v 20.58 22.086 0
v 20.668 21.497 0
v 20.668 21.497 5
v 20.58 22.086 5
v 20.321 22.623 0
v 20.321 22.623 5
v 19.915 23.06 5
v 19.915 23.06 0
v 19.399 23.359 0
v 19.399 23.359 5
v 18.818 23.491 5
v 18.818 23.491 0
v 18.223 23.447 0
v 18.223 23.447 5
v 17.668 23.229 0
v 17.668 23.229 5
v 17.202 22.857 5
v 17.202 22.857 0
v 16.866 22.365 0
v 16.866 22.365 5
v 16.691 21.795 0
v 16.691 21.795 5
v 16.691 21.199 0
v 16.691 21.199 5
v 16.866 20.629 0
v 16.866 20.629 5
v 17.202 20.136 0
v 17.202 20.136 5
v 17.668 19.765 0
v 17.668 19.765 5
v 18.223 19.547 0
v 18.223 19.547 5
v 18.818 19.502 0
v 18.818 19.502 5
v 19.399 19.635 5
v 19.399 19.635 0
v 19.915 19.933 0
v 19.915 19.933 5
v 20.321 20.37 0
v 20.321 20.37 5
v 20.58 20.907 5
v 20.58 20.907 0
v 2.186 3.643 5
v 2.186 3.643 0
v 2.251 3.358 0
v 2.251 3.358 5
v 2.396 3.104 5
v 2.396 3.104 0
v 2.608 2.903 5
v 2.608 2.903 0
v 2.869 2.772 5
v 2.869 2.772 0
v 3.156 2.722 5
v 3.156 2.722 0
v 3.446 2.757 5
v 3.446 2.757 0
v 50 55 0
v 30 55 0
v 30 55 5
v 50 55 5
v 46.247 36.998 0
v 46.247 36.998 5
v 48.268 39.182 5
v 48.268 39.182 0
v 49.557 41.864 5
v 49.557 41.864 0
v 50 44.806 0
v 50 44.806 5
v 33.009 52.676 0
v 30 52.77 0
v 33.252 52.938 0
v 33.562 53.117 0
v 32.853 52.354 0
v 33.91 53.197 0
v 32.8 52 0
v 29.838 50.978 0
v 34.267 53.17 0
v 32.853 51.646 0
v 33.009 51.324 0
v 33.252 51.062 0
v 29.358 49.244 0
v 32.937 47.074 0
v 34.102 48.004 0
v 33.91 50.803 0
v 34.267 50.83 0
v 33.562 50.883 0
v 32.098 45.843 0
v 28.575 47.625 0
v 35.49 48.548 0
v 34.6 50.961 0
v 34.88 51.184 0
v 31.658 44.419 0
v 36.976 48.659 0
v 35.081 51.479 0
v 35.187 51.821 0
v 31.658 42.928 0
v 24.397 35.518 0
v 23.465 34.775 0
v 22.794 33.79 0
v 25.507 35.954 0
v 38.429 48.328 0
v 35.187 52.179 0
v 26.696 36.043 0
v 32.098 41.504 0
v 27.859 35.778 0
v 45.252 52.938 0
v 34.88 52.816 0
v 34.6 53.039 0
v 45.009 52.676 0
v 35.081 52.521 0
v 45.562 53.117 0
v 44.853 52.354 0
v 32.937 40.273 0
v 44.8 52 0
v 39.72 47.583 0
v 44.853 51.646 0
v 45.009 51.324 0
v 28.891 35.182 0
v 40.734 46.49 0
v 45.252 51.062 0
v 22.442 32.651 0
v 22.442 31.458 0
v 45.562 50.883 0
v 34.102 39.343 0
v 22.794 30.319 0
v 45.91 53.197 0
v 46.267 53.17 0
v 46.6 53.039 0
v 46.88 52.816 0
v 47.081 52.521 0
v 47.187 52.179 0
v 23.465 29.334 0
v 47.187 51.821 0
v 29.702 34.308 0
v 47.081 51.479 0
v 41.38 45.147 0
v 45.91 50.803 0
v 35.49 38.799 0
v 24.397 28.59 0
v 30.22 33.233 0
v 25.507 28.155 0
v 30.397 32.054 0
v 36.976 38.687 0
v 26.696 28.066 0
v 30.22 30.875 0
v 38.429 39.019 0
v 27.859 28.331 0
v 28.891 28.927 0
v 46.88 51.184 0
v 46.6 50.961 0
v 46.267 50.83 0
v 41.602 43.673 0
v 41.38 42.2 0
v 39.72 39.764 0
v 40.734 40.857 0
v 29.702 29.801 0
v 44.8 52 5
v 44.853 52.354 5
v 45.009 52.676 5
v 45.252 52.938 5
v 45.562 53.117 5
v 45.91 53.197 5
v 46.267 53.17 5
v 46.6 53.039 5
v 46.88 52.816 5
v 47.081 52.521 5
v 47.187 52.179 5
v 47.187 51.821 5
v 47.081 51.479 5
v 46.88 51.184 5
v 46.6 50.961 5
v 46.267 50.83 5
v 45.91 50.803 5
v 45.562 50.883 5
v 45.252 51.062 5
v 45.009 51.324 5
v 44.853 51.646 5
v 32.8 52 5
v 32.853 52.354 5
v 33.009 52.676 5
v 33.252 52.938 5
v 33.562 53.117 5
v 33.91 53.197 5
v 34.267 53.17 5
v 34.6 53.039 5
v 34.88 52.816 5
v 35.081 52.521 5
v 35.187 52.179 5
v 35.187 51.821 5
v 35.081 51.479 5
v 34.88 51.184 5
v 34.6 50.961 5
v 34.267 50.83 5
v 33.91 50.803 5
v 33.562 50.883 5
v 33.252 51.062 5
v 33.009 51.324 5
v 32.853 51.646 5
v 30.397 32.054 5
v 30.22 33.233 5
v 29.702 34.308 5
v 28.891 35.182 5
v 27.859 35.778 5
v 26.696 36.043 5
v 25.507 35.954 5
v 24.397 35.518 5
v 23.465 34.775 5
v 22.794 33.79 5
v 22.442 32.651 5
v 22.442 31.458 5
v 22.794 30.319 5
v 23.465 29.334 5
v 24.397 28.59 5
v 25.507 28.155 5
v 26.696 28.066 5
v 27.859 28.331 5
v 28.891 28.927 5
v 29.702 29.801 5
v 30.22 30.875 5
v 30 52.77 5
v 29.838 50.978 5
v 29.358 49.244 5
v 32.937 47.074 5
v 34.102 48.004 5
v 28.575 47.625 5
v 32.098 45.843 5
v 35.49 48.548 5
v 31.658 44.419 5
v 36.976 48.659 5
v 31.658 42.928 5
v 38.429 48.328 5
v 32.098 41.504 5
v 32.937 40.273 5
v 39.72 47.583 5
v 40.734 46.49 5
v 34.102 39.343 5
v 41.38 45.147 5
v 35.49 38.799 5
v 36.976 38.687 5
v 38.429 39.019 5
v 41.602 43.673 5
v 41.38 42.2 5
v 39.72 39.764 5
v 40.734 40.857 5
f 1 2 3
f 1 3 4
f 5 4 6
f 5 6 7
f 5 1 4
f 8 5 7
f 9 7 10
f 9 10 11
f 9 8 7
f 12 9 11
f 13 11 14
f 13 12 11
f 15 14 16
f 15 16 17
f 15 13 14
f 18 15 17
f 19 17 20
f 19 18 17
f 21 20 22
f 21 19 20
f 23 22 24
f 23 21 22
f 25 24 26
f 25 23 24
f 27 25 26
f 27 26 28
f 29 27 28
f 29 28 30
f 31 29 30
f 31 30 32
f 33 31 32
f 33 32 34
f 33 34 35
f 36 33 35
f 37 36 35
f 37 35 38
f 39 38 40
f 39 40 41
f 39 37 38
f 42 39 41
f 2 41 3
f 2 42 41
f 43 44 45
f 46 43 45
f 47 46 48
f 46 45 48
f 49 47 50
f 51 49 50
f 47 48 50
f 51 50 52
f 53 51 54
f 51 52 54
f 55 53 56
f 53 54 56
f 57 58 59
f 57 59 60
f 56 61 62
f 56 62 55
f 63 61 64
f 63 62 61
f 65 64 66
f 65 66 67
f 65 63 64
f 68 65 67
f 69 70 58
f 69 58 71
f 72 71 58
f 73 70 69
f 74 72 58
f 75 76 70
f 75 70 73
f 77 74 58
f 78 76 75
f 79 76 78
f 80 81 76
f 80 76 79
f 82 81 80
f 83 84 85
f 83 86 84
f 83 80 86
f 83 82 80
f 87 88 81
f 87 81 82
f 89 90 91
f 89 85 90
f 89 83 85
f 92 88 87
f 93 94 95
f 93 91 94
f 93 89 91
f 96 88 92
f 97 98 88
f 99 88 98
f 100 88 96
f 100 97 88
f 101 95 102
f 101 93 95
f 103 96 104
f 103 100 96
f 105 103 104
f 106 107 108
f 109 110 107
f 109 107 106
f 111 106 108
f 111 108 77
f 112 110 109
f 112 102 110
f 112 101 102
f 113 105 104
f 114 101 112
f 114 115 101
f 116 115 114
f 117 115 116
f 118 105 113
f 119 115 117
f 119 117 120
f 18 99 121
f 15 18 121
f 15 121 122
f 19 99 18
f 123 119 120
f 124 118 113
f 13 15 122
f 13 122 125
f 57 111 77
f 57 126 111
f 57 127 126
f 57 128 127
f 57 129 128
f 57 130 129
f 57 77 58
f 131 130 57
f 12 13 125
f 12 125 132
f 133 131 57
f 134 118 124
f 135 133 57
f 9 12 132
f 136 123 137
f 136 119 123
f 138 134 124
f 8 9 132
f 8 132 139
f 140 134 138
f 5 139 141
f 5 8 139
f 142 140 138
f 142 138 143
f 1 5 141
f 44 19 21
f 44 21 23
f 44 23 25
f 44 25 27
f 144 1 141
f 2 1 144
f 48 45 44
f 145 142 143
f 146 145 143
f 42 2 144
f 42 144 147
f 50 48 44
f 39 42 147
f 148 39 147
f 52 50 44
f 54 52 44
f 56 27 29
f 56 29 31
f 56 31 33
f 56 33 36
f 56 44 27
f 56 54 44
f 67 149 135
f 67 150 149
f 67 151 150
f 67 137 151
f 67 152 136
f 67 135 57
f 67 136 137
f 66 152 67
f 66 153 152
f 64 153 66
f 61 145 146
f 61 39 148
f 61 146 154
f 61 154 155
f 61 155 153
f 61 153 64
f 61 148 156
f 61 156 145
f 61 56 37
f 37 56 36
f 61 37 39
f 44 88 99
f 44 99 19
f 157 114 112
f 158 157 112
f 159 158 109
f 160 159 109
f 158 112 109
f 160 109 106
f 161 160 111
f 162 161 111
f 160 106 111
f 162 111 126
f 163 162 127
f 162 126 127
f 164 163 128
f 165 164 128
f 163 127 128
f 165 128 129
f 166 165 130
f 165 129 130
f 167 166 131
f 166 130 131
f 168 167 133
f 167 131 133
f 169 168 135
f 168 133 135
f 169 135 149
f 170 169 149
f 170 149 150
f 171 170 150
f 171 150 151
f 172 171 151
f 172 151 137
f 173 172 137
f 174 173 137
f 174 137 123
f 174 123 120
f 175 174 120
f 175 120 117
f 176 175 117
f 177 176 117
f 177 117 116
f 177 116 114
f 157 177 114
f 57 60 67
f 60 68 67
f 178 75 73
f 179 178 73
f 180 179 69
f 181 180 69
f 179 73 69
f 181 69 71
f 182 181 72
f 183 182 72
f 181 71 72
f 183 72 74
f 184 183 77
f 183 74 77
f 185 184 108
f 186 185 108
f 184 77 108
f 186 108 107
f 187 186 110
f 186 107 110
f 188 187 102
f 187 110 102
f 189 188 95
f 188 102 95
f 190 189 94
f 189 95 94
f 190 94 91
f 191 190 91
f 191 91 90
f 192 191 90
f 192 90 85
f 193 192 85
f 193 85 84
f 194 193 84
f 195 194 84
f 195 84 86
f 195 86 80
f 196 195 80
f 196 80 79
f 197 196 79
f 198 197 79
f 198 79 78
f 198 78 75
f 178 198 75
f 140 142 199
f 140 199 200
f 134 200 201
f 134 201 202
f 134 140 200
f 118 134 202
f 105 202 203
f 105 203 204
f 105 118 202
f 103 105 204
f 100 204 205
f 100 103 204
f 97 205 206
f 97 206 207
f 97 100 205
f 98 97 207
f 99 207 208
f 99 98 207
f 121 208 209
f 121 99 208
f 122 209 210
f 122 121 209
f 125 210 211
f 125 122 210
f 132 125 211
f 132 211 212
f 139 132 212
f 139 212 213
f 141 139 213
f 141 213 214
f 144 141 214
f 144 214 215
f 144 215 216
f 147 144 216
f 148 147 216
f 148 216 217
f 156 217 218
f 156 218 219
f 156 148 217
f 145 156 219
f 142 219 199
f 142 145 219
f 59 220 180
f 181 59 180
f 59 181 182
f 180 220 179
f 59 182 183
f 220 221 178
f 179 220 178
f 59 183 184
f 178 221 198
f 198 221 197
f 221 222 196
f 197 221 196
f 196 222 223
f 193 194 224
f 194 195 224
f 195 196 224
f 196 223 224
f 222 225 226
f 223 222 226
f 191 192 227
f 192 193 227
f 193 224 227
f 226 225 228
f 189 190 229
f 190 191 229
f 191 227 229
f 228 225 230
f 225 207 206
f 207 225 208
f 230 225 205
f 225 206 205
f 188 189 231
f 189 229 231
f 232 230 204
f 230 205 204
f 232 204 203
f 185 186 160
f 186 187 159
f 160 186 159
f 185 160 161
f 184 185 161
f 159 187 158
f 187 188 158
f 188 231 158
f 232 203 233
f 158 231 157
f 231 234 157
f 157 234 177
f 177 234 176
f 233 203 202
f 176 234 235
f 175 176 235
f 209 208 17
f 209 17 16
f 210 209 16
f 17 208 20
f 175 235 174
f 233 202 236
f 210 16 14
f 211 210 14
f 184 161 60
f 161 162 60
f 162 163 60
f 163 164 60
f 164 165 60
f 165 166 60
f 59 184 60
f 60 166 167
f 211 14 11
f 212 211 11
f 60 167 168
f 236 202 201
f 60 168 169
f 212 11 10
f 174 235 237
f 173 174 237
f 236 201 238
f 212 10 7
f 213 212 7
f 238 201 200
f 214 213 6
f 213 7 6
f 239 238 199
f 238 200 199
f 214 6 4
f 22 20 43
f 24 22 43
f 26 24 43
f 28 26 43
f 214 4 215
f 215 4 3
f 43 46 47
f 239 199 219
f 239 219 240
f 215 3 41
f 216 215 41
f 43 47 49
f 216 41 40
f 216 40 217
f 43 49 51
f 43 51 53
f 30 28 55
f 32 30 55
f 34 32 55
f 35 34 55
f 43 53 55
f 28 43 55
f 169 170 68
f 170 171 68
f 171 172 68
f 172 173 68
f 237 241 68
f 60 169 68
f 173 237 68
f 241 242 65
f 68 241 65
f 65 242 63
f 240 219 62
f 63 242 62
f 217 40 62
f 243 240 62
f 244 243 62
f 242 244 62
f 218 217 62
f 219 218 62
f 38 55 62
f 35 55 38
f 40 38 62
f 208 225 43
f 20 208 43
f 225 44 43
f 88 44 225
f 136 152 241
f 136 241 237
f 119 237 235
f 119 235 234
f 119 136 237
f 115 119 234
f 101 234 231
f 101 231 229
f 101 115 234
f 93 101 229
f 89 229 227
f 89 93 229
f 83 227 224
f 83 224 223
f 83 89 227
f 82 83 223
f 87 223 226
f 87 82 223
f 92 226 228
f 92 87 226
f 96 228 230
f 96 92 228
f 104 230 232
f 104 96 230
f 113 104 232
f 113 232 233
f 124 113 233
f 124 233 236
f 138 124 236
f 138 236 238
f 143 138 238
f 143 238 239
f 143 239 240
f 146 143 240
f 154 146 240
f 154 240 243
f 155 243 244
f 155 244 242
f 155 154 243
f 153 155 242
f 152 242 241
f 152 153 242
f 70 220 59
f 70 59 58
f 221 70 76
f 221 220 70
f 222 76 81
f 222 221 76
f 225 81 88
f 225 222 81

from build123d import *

# Parameters (mm, degrees)
ESQUISSE1_R                  = 5
ESQUISSE1_R_2                = 4
ESQUISSE1_R_3                = 2
BOSS_EXTRU_1_DEPTH           = 5
ENL_V_MAT_EXTRU_1_DEPTH      = 1
ENL_V_MAT_EXTRU_1_DEPTH_BACK = 5
CONG_1_R                     = 10
ESQUISSE3_W                  = 20
ESQUISSE3_H                  = 5
BOSS_EXTRU_2_DEPTH           = 5
D_GAGEMENT_M21_D             = 2.4
D_GAGEMENT_M21_DEPTH         = 5
CONG_2_R                     = 10


with BuildPart() as part:
    # Esquisse1 → Boss.-Extru.1 (new body)
    with BuildSketch(Plane.XY):
        Polygon((0, 0), (30, 50), (50, 50), (50, 40), align=None)
        with Locations((36.602361653, 43.673429465)):
            Circle(ESQUISSE1_R, mode=Mode.SUBTRACT)
        with Locations((26.397486101, 32.05434035)):
            Circle(ESQUISSE1_R_2, mode=Mode.SUBTRACT)
        with Locations((18.668376917, 21.496804042)):
            Circle(ESQUISSE1_R_3, mode=Mode.SUBTRACT)
    extrude(amount=BOSS_EXTRU_1_DEPTH)

    # Esquisse2 → Enlèv. mat.-Extru.1 (cut, two sides)
    with BuildSketch(Plane(origin=(0, 0, 0), x_dir=(-1, 0, 0), z_dir=(0, 0, -1))) as enl_v_mat_extru_1_sk:
        with BuildLine():
            Line((0, 0), (-2.185666909, 3.642778182))
            ThreePointArc((-2.185666909, 3.642778182), (-2.607581993, 2.90339912), (-3.446178626, 2.756942901))
            Line((-3.446178626, 2.756942901), (0, 0))
        make_face()
    extrude(amount=ENL_V_MAT_EXTRU_1_DEPTH, mode=Mode.SUBTRACT)
    extrude(enl_v_mat_extru_1_sk.sketch, amount=-ENL_V_MAT_EXTRU_1_DEPTH_BACK, mode=Mode.SUBTRACT)

    # Congé1
    cong_1_edges = [part.edges().sort_by_distance(p)[0] for p in [
        (50, 40, 2.5),
    ]]
    fillet(cong_1_edges, radius=CONG_1_R)

    # Esquisse3 → Boss.-Extru.2 (add)
    with BuildSketch(Plane(origin=(0, 50, 0), x_dir=(1, 0, 0), z_dir=(0, 1, 0))):
        with Locations((40, -2.5)):
            Rectangle(ESQUISSE3_W, ESQUISSE3_H)
    extrude(amount=BOSS_EXTRU_2_DEPTH)

    # Dégagement M21
    with Locations(Plane.XY.offset(5)):
        with Locations((46, 52), (34, 52)):
            Hole(D_GAGEMENT_M21_D / 2, depth=D_GAGEMENT_M21_DEPTH)

    # Congé2
    cong_2_edges = [part.edges().sort_by_distance(p)[0] for p in [
        (30, 50, 2.5),
    ]]
    fillet(cong_2_edges, radius=CONG_2_R)


solid = part.part
